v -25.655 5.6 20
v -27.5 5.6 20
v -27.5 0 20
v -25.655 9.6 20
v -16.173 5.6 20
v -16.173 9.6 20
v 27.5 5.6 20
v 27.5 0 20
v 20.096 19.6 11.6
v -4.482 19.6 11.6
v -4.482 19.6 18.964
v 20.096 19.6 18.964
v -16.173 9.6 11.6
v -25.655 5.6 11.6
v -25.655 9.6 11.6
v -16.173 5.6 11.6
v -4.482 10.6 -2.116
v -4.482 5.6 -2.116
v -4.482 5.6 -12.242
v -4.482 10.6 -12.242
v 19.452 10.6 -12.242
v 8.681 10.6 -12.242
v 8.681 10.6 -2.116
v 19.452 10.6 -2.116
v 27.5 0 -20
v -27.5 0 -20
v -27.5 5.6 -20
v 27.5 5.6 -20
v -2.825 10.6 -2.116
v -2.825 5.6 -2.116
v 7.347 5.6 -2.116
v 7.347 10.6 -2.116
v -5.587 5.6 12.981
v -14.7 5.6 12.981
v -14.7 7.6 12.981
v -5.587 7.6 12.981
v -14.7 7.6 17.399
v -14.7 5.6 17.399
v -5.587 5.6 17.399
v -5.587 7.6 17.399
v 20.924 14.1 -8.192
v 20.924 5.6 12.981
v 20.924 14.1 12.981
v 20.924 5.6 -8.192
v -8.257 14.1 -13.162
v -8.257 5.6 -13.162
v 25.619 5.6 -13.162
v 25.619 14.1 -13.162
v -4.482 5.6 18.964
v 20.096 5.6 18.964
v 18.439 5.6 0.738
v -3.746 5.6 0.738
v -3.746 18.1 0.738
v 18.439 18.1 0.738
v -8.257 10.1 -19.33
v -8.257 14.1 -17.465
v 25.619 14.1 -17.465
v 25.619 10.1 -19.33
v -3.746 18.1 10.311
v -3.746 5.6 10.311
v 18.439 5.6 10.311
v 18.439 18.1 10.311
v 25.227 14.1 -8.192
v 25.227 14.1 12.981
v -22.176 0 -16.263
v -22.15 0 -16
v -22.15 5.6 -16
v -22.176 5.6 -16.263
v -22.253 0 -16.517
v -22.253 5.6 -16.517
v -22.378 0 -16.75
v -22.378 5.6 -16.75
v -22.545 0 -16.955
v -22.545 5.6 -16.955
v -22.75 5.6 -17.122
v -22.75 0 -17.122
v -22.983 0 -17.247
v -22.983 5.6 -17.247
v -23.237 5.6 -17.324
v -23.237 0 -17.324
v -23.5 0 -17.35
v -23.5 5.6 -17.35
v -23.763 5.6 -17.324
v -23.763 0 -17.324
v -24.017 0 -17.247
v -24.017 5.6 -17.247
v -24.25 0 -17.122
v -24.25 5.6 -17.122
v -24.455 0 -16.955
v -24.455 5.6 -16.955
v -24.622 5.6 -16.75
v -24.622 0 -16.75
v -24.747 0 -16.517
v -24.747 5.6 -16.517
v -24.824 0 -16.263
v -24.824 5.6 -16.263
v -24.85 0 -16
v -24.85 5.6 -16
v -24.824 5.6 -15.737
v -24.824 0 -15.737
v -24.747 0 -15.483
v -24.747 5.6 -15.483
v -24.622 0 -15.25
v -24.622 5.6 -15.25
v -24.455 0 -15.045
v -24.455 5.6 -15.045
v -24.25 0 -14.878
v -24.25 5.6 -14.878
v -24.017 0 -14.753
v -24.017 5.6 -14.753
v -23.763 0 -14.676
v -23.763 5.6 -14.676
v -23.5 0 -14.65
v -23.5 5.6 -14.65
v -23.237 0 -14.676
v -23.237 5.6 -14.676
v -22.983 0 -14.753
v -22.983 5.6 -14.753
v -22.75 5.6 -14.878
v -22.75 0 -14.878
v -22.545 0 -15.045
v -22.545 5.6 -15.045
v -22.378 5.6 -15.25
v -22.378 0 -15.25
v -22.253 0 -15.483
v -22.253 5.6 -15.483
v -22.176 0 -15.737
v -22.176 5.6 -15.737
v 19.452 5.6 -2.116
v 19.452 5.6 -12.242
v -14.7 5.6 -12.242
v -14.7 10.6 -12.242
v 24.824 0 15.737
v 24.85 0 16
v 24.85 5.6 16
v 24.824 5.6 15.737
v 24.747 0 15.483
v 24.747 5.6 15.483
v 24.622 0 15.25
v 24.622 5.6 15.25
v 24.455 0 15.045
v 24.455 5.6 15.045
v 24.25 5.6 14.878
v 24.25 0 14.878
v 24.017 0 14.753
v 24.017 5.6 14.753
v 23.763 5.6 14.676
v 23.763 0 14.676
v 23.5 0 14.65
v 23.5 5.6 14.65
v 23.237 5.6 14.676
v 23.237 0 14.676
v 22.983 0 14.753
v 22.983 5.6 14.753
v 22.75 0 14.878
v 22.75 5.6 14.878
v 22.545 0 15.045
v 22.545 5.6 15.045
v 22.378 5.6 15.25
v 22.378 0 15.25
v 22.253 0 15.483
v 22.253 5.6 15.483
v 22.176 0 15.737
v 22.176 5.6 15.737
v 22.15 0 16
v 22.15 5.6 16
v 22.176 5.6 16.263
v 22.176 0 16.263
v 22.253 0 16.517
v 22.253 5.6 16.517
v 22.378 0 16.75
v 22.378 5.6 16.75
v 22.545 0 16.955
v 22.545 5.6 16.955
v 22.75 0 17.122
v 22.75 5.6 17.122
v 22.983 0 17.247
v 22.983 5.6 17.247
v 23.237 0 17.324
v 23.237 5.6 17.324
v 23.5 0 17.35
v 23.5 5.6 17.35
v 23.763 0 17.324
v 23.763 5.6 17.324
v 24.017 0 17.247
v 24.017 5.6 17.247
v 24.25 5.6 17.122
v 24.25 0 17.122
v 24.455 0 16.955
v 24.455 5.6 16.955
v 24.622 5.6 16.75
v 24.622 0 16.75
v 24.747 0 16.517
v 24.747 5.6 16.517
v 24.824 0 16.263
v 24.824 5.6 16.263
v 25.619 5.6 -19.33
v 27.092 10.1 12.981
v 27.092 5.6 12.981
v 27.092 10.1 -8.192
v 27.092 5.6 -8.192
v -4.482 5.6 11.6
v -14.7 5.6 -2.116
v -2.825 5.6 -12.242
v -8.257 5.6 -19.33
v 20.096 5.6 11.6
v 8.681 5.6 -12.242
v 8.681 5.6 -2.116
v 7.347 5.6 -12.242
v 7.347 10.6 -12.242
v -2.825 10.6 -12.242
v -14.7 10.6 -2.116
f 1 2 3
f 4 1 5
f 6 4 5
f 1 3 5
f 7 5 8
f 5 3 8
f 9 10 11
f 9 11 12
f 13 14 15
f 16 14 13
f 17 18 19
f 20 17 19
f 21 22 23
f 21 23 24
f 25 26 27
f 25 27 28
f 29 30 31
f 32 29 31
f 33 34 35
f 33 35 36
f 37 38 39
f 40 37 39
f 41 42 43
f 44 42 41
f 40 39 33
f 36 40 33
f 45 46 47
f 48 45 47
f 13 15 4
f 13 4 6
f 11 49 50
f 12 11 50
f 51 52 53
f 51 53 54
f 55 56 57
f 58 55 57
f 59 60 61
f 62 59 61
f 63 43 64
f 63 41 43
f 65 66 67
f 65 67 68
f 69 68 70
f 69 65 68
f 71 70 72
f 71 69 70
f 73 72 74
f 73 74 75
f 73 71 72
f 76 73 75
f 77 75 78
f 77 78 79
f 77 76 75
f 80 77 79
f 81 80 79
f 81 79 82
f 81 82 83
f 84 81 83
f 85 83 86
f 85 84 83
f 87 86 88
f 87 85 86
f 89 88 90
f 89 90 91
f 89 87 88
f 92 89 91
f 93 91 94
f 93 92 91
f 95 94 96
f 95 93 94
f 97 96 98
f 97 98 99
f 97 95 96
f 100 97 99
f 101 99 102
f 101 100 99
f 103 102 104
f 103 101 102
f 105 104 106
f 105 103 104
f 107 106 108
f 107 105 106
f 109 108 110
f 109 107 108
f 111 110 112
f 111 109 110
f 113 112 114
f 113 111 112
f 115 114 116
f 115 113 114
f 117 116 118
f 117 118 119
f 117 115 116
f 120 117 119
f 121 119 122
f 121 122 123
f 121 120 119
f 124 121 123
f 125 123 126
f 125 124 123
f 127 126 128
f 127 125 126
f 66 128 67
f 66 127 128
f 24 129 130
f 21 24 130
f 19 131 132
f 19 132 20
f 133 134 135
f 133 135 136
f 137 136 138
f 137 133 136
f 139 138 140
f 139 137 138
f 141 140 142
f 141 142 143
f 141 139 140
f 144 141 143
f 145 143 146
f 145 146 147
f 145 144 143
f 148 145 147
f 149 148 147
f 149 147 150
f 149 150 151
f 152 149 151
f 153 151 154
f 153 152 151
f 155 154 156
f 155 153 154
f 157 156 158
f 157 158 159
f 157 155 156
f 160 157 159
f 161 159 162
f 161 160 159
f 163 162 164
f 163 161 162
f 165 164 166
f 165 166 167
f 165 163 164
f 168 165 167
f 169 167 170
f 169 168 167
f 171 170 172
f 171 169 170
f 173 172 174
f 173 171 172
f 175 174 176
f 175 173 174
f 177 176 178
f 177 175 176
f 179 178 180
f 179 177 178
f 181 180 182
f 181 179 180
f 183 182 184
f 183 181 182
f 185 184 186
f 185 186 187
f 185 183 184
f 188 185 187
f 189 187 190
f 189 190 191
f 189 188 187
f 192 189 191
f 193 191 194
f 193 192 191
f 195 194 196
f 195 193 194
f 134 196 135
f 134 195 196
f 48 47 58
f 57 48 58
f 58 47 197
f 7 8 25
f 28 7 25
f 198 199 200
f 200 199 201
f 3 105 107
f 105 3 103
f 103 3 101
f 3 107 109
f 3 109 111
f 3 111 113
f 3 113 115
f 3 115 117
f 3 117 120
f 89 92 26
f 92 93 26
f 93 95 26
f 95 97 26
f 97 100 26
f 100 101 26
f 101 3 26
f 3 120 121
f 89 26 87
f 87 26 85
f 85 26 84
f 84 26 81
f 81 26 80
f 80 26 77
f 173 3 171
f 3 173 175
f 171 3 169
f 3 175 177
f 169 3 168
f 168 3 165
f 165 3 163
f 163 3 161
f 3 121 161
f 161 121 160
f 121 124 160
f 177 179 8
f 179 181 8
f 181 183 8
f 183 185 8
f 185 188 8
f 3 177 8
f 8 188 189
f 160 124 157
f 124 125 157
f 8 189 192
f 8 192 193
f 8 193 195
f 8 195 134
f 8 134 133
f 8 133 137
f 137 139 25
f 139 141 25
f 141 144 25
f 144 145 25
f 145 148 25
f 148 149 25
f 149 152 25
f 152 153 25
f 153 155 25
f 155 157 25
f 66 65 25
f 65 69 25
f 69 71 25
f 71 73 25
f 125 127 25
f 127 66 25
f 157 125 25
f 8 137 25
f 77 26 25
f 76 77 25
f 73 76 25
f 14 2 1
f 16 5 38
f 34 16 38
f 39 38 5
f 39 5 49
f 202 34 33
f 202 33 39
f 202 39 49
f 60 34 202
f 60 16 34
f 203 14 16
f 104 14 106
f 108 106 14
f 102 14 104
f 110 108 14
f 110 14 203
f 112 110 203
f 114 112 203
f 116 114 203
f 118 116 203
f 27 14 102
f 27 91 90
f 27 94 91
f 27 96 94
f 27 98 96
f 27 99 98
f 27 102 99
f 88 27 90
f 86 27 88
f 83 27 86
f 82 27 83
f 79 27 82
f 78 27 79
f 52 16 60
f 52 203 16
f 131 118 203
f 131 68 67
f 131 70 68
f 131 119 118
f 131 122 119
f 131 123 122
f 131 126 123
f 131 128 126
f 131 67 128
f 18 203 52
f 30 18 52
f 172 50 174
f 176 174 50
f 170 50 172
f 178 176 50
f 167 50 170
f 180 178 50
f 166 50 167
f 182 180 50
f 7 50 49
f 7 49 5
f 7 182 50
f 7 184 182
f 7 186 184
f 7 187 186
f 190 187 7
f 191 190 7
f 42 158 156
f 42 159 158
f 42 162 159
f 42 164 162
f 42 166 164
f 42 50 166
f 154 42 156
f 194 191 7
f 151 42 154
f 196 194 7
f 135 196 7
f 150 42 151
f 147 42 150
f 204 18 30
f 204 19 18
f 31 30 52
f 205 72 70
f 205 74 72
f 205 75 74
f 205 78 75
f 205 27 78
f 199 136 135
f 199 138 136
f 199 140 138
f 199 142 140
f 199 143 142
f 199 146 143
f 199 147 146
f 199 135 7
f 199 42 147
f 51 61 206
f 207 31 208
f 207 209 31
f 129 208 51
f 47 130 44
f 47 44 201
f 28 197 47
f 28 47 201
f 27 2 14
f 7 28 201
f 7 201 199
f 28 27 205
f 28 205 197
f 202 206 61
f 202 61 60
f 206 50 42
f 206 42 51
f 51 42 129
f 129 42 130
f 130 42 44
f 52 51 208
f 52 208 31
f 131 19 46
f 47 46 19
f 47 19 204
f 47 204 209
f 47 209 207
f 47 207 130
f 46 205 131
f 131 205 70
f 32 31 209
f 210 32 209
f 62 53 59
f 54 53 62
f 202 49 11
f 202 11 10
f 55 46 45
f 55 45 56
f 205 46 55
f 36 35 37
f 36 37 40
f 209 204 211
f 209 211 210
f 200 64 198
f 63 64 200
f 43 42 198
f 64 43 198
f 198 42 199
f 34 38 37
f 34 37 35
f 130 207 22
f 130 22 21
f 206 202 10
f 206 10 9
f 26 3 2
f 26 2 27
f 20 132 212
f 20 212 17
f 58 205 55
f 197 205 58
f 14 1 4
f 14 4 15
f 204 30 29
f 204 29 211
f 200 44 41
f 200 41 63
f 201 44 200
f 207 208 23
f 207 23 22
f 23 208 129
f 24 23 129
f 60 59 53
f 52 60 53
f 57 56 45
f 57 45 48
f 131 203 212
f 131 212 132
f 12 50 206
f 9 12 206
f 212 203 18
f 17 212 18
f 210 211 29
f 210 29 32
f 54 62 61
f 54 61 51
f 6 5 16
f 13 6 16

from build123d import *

# Parameters (mm, degrees)
SKIZZE1_W                       = 55
SKIZZE1_H                       = 40
SKIZZE1_R                       = 1.35
AUFSATZ_LINEAR_AUSTRAGEN1_DEPTH = 5.6
SKIZZE2_W                       = 33.875763277
SKIZZE2_H                       = 6.167598205
SKIZZE2_W_2                     = 6.167598205
SKIZZE2_H_2                     = 21.172352048
AUFSATZ_LINEAR_AUSTRAGEN2_DEPTH = 8.5
SKIZZE2_3_W                     = 9.48153157
SKIZZE2_3_H                     = 8.400032762
AUFSATZ_LINEAR_AUSTRAGEN3_DEPTH = 4
SKIZZE2_4_W                     = 10.217961205
SKIZZE2_4_H                     = 10.125907501
SKIZZE2_4_W_2                   = 10.171934354
SKIZZE2_4_W_3                   = 10.770283433
AUFSATZ_LINEAR_AUSTRAGEN4_DEPTH = 5
SKIZZE2_5_W                     = 22.184942798
SKIZZE2_5_H                     = 9.573585274
AUFSATZ_LINEAR_AUSTRAGEN5_DEPTH = 12.5
SKIZZE2_6_W                     = 24.578339117
SKIZZE2_6_H                     = 7.364296365
AUFSATZ_LINEAR_AUSTRAGEN6_DEPTH = 14
SKIZZE2_7_W                     = 9.113316751
SKIZZE2_7_H                     = 4.418577819
AUFSATZ_LINEAR_AUSTRAGEN7_DEPTH = 2
FASE1_SIZE                      = 4
FASE1_SIZE2                     = 1.865230633
FASE1_PART_2_SIZE               = 4
FASE1_PART_2_SIZE2              = 1.865230633


with BuildPart() as part:
    # Skizze1 → Aufsatz-Linear austragen1 (new body)
    with BuildSketch(Plane(origin=(0, 0, 0), x_dir=(1, 0, 0), z_dir=(0, 1, 0))):
        Rectangle(SKIZZE1_W, SKIZZE1_H)
        with Locations((-23.5, 16)):
            Circle(SKIZZE1_R, mode=Mode.SUBTRACT)
        with Locations((23.5, -16)):
            Circle(SKIZZE1_R, mode=Mode.SUBTRACT)
    extrude(amount=AUFSATZ_LINEAR_AUSTRAGEN1_DEPTH)

    # Skizze2 → Aufsatz-Linear austragen2 (add)
    with BuildSketch(Plane(origin=(0, 5.6, 0), x_dir=(1, 0, 0), z_dir=(0, 1, 0))):
        with Locations((8.681351592, 16.246278391)):
            Rectangle(SKIZZE2_W, SKIZZE2_H)
        with Locations((24.008293401, -2.394596782)):
            Rectangle(SKIZZE2_W_2, SKIZZE2_H_2)
    extrude(amount=AUFSATZ_LINEAR_AUSTRAGEN2_DEPTH)

    # Skizze2<3> → Aufsatz-Linear austragen3 (add)
    with BuildSketch(Plane(origin=(0, 5.6, 0), x_dir=(1, 0, 0), z_dir=(0, 1, 0))):
        with Locations((-20.913914423, -15.799983619)):
            Rectangle(SKIZZE2_3_W, SKIZZE2_3_H)
    extrude(amount=AUFSATZ_LINEAR_AUSTRAGEN3_DEPTH)

    # Skizze2<4> → Aufsatz-Linear austragen4 (add)
    with BuildSketch(Plane(origin=(0, 5.6, 0), x_dir=(1, 0, 0), z_dir=(0, 1, 0))):
        with Locations((-9.591308763, 7.178988492)):
            Rectangle(SKIZZE2_4_W, SKIZZE2_4_H)
        with Locations((2.260605699, 7.178988492)):
            Rectangle(SKIZZE2_4_W_2, SKIZZE2_4_H)
        with Locations((14.066493309, 7.178988492)):
            Rectangle(SKIZZE2_4_W_3, SKIZZE2_4_H)
    extrude(amount=AUFSATZ_LINEAR_AUSTRAGEN4_DEPTH)

    # Skizze2<5> → Aufsatz-Linear austragen5 (add)
    with BuildSketch(Plane(origin=(0, 5.6, 0), x_dir=(1, 0, 0), z_dir=(0, 1, 0))):
        with Locations((7.346572876, -5.524422737)):
            Rectangle(SKIZZE2_5_W, SKIZZE2_5_H)
    extrude(amount=AUFSATZ_LINEAR_AUSTRAGEN5_DEPTH)

    # Skizze2<6> → Aufsatz-Linear austragen6 (add)
    with BuildSketch(Plane(origin=(0, 5.6, 0), x_dir=(1, 0, 0), z_dir=(0, 1, 0))):
        with Locations((7.806841398, -15.282115421)):
            Rectangle(SKIZZE2_6_W, SKIZZE2_6_H)
    extrude(amount=AUFSATZ_LINEAR_AUSTRAGEN6_DEPTH)

    # Skizze2<7> → Aufsatz-Linear austragen7 (add)
    with BuildSketch(Plane(origin=(0, 5.6, 0), x_dir=(1, 0, 0), z_dir=(0, 1, 0))):
        with Locations((-10.14363099, -15.190061716)):
            Rectangle(SKIZZE2_7_W, SKIZZE2_7_H)
    extrude(amount=AUFSATZ_LINEAR_AUSTRAGEN7_DEPTH)

    # Fase1
    fase1_edges = [part.edges().sort_by_distance(p)[0] for p in [
        (8.681351592, 14.1, -19.330077493),
    ]]
    fase1_side = [part.faces().sort_by_distance(p)[0] for p in [
        (8.681351592, 9.85, -19.330077493),
    ]]
    chamfer(fase1_edges, length=FASE1_SIZE, length2=FASE1_SIZE2, reference=fase1_side[0])

    # Fase1 part 2
    fase1_part_2_edges = [part.edges().sort_by_distance(p)[0] for p in [
        (27.092092503, 14.1, 2.394596782),
    ]]
    fase1_part_2_side = [part.faces().sort_by_distance(p)[0] for p in [
        (27.092092503, 9.85, 2.394596782),
    ]]
    chamfer(fase1_part_2_edges, length=FASE1_PART_2_SIZE, length2=FASE1_PART_2_SIZE2, reference=fase1_part_2_side[0])


solid = part.part
